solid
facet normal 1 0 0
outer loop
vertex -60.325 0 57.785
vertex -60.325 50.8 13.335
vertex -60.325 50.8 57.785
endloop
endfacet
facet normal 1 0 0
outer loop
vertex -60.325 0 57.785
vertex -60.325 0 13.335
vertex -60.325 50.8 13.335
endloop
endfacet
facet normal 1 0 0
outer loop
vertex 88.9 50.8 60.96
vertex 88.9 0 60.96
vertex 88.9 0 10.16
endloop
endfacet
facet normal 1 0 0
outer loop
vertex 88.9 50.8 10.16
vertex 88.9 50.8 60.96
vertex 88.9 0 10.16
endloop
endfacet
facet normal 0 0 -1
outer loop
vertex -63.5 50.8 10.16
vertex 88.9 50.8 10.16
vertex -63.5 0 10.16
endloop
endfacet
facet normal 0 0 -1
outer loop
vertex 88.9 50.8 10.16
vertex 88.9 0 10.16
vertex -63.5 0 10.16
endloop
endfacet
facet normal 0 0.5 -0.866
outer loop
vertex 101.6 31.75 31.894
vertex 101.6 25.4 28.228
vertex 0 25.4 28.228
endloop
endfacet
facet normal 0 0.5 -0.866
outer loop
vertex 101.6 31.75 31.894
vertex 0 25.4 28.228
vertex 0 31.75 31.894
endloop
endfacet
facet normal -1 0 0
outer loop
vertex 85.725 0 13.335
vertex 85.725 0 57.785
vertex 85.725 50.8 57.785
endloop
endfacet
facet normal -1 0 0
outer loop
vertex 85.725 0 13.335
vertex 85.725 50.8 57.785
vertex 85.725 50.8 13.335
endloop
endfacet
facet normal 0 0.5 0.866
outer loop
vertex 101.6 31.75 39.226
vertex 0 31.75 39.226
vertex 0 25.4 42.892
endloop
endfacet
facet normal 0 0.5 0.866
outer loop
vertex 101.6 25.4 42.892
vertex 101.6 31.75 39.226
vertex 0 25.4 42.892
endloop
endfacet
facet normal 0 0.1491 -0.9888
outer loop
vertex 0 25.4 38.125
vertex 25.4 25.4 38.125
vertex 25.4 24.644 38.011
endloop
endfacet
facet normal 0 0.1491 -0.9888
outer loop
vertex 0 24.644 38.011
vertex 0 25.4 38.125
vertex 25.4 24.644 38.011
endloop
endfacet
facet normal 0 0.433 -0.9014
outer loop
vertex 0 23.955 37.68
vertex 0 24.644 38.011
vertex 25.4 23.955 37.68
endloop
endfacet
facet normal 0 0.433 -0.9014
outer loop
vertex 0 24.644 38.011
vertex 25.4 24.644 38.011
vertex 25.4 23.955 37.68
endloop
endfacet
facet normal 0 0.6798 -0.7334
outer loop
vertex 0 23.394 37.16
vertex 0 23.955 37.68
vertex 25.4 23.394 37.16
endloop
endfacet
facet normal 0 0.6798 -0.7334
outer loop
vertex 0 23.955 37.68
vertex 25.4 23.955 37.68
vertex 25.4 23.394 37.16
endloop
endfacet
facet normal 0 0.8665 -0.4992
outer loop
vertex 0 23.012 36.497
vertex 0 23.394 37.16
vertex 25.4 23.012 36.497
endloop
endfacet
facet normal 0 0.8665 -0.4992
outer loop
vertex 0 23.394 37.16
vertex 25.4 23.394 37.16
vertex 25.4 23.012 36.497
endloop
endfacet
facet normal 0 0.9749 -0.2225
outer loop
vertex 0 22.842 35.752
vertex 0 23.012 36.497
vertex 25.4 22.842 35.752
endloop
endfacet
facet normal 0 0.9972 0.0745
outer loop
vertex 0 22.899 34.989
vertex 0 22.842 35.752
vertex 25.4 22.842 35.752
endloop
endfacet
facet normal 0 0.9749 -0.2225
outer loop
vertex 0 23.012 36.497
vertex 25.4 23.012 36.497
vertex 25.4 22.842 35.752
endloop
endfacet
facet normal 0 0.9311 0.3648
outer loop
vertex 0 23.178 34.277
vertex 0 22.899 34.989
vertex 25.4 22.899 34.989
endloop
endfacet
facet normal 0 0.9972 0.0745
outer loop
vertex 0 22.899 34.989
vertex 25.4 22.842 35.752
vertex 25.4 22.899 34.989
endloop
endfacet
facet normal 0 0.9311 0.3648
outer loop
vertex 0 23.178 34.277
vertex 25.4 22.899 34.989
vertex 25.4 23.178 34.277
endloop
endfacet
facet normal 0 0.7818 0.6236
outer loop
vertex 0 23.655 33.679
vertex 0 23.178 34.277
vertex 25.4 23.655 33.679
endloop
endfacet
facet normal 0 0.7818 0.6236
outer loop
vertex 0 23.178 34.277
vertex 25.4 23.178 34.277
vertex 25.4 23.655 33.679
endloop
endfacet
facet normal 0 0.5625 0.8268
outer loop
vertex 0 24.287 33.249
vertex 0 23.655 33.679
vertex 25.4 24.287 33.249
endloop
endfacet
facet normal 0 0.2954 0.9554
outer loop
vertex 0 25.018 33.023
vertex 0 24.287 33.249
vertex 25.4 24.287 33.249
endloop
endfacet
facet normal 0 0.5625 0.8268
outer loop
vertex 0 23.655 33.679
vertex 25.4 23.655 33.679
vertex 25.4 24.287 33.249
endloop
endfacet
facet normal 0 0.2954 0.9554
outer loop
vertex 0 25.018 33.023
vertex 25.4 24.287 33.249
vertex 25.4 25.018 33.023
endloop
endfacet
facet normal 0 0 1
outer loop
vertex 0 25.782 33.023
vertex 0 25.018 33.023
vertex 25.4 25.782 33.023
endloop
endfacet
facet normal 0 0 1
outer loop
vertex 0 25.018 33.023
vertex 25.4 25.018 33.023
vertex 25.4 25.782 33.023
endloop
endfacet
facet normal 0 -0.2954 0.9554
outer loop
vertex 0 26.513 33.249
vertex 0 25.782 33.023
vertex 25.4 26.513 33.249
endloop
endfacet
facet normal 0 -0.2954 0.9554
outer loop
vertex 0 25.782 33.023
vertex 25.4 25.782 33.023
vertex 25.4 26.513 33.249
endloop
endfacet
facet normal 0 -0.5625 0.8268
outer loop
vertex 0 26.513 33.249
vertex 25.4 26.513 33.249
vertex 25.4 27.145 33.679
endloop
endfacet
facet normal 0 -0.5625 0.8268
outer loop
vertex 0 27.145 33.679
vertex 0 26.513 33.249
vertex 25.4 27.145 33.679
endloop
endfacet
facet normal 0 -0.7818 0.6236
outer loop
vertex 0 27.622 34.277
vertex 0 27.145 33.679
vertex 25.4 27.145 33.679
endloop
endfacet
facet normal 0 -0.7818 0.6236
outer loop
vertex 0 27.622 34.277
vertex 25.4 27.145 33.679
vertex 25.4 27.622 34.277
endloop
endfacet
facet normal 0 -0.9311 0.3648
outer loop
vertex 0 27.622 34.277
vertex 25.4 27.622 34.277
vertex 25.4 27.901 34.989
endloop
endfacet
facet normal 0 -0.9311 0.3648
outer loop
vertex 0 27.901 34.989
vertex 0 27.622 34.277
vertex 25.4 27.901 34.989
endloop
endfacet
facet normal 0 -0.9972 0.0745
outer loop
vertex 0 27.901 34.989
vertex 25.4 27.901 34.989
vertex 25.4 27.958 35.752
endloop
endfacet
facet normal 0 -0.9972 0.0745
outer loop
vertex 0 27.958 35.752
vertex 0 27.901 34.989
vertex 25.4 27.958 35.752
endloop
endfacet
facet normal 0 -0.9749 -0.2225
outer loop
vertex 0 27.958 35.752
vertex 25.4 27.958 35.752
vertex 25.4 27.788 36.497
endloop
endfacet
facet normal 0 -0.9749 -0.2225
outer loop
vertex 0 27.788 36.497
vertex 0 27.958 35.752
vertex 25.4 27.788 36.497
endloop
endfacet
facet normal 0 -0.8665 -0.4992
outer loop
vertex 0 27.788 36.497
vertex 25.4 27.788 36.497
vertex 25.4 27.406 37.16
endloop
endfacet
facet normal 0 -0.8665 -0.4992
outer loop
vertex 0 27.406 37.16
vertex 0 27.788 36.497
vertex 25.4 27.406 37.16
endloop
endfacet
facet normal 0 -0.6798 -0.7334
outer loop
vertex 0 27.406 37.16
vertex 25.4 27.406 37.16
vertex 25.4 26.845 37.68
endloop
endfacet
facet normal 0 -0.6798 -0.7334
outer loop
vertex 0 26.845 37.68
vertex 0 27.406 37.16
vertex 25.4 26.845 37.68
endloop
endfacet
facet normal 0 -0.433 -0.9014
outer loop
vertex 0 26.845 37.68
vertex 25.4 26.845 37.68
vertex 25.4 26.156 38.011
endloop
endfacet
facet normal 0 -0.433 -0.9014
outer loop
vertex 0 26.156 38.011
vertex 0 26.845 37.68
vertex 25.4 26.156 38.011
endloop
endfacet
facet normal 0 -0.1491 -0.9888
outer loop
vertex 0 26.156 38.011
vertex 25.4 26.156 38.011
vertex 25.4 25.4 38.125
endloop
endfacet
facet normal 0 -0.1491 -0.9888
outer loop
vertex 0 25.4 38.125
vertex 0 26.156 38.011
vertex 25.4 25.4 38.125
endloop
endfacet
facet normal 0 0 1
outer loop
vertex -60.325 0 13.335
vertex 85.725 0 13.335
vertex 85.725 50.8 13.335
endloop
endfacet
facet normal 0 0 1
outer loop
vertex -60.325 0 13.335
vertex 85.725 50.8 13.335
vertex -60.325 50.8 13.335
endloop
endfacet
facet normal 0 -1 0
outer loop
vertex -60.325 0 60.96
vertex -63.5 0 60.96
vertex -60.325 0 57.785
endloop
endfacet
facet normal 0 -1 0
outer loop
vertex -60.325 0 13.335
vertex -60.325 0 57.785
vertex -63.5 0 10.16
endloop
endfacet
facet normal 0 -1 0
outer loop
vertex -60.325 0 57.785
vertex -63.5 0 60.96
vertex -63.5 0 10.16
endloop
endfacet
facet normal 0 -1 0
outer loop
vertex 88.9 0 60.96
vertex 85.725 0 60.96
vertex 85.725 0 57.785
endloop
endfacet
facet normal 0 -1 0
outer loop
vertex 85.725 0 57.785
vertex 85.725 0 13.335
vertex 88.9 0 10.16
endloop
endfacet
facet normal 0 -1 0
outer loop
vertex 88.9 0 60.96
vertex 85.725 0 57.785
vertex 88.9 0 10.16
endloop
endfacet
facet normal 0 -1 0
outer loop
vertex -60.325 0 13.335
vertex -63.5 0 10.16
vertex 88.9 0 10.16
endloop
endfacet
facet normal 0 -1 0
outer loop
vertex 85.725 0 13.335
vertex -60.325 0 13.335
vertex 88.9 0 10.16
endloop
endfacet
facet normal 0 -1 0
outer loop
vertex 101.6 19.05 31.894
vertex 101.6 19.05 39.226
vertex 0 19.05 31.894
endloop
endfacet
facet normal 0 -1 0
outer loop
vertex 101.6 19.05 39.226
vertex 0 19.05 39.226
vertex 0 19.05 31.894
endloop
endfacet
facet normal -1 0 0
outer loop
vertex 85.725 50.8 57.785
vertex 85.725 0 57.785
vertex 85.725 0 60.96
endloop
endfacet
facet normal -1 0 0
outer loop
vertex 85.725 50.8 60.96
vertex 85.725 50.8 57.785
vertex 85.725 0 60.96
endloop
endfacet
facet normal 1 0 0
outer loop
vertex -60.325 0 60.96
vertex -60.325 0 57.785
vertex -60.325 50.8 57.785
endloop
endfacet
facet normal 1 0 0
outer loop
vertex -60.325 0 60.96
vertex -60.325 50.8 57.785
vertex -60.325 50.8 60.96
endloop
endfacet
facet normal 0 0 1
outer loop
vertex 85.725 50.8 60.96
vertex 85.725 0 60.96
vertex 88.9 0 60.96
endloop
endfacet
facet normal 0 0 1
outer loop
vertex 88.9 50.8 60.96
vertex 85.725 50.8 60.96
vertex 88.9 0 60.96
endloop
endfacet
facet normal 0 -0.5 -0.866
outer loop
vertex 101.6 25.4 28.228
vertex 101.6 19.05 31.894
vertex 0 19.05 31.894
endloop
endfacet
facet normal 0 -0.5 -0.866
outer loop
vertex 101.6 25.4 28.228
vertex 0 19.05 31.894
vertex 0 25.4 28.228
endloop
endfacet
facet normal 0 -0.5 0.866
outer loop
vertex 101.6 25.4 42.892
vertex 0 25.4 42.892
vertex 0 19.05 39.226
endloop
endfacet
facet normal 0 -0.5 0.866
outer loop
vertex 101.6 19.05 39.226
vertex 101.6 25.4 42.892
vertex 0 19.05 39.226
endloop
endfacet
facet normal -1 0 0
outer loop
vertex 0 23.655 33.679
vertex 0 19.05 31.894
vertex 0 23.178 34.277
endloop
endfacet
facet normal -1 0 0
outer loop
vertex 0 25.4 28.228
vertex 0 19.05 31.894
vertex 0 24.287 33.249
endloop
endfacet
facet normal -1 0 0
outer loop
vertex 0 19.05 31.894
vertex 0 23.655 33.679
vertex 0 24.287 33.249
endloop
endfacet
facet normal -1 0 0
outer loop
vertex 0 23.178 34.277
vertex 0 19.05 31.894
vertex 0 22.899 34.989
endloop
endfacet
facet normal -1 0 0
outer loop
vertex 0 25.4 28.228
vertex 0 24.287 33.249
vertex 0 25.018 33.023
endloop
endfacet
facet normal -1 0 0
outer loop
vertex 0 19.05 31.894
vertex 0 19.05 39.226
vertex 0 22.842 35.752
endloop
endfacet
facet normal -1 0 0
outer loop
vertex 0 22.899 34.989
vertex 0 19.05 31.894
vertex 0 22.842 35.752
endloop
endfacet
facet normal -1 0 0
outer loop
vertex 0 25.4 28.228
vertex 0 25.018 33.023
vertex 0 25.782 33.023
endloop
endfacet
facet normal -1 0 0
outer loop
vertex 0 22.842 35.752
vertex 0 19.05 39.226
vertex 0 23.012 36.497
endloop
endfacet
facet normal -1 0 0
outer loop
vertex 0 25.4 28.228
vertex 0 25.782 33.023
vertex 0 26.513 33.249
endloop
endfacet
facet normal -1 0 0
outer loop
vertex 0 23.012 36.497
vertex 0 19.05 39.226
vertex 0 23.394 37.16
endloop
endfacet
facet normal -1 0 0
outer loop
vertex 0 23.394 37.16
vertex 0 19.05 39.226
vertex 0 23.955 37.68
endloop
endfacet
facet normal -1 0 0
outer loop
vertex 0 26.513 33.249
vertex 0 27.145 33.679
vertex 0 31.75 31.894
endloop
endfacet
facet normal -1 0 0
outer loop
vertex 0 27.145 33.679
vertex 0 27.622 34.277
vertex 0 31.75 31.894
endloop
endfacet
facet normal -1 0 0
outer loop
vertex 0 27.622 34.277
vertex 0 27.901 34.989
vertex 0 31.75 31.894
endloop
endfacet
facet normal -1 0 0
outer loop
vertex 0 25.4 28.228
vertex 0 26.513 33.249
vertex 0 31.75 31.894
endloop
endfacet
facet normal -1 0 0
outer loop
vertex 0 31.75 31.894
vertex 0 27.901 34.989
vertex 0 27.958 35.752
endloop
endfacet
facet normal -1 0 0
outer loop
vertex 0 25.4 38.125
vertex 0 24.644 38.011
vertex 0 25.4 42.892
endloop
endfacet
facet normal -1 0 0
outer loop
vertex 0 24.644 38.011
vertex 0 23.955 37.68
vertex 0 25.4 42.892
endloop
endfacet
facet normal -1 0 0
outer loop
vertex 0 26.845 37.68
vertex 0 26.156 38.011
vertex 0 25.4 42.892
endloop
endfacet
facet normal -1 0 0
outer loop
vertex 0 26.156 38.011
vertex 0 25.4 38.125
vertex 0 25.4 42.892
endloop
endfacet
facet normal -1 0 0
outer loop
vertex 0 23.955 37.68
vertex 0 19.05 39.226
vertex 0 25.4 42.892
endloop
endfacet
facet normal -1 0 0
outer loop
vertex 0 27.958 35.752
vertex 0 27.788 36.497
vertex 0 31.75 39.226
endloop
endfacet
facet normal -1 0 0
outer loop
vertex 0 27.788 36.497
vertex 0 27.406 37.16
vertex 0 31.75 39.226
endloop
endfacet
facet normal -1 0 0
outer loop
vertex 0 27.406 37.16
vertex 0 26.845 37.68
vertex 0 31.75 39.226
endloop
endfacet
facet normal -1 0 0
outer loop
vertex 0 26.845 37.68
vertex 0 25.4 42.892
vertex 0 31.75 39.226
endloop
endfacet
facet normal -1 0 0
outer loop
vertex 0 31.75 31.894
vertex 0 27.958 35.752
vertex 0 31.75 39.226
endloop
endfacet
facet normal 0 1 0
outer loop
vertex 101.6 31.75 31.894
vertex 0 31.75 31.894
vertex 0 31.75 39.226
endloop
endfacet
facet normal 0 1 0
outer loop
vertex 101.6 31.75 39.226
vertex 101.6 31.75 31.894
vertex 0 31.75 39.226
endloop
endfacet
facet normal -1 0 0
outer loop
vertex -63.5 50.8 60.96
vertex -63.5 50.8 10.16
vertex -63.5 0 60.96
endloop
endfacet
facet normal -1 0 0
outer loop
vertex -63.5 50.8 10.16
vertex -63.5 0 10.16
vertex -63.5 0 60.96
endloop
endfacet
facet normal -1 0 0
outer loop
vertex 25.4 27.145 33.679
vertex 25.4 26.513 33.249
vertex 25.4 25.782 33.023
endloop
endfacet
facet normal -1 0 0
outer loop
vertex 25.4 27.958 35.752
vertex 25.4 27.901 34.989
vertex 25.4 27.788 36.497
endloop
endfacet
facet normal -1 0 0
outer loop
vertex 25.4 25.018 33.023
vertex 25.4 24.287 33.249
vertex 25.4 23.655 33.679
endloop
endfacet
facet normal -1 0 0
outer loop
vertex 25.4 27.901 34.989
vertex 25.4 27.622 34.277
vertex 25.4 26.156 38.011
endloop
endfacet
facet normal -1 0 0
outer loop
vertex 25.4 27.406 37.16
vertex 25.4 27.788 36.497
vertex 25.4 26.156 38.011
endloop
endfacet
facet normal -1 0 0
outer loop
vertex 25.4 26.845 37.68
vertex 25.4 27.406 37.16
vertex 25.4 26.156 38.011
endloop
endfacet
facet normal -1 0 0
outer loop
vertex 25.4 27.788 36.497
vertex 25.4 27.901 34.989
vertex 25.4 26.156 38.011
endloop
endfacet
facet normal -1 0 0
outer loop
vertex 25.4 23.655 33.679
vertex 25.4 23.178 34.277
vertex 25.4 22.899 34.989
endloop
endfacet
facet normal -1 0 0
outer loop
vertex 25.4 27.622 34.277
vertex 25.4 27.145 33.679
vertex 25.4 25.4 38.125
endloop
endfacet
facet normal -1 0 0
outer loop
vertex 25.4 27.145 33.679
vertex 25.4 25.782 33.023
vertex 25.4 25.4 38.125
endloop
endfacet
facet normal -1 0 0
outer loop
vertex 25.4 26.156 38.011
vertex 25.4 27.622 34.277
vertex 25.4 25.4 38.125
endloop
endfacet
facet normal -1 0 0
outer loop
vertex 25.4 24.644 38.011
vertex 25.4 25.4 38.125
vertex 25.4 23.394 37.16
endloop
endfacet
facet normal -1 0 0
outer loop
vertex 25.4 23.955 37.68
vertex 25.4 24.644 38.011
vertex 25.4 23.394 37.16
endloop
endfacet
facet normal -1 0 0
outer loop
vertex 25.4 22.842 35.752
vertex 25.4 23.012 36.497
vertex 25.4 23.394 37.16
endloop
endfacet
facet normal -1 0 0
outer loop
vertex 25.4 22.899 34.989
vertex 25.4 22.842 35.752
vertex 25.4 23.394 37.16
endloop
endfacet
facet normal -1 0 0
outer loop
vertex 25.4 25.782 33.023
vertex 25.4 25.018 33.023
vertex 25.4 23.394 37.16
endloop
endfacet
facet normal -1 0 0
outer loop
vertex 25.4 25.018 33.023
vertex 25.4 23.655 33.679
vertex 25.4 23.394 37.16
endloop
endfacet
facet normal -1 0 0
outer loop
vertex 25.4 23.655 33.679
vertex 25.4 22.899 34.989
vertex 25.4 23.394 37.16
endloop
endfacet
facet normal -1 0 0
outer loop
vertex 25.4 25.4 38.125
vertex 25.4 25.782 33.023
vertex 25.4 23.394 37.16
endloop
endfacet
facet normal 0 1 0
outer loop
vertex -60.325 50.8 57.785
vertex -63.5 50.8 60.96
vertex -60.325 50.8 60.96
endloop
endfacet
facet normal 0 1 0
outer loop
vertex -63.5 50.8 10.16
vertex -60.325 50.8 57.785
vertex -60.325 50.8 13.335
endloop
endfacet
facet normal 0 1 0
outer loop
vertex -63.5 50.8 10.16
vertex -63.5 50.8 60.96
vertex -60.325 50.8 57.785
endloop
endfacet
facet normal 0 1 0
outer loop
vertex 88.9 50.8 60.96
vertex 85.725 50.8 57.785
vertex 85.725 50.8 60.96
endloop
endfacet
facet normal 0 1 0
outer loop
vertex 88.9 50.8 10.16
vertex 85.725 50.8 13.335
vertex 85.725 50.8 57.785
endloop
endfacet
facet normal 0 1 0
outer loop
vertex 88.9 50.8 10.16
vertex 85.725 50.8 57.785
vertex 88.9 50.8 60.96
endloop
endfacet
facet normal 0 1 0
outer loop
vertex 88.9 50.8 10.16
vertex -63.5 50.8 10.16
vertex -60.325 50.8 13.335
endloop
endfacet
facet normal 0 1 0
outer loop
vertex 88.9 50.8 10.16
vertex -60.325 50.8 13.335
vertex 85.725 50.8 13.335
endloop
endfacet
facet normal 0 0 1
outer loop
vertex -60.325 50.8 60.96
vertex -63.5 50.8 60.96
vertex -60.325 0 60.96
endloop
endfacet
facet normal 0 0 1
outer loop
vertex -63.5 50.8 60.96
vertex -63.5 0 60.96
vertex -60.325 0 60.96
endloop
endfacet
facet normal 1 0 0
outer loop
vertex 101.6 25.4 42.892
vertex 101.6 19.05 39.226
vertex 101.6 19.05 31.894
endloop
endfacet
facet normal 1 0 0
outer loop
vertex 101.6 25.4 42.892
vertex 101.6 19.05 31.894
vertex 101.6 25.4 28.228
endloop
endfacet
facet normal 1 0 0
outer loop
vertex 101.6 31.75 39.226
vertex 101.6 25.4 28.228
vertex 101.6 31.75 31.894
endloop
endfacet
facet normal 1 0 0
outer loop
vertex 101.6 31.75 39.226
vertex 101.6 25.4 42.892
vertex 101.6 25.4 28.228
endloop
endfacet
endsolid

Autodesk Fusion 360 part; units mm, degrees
sketch "Sketch1" plane through (0, 0, 0) normal (0, 1, 0) x (1, 0, 0) in component "Winch Baseplate"
  line L0 (88.9, -60.96) -> (88.9, -10.16)
  line L1 (88.9, -10.16) -> (-63.5, -10.16)
  line L2 (-63.5, -10.16) -> (-63.5, -60.96)
  line L3 (85.725, -57.785) -> (85.725, -13.335)
  line L4 (85.725, -13.335) -> (-60.325, -13.335)
  line L5 (-60.325, -13.335) -> (-60.325, -57.785)
  line L6 (-60.325, -57.785) -> (-60.325, -60.96)
  line L7 (85.725, -57.785) -> (85.725, -60.96)
  line L8 (-63.5, -60.96) -> (-60.325, -60.96)
  line L9 (85.725, -60.96) -> (88.9, -60.96)
  dimension "d1" = 152.4
  dimension "d2" = 50.8
extrude "Extrude1" add sketch "Sketch1" along normal blind 50.8 makes body 1 in component "Winch Baseplate"
sketch "Sketch1 (2)" plane through (0, 0, 0) normal (1, 0, 0) x (0, 1, 0) in component "Winch Axle Extension"
  curve L0
  line L1 (50.8, 10.16) -> (0, 60.96)
  line L2 (19.05, 31.8938) -> (25.4, 28.2277)
  line L3 (25.4, 28.2277) -> (31.75, 31.8938)
  line L4 (31.75, 31.8938) -> (31.75, 39.2262)
  line L5 (31.75, 39.2262) -> (25.4, 42.8923)
  line L6 (25.4, 42.8923) -> (19.05, 39.2262)
  line L7 (19.05, 39.2262) -> (19.05, 31.8938)
  point P0 (25.4, 35.56)
  dimension "d7" = 6.35
extrude "Extrude1'" add sketch "Sketch1 (2)" along normal blind 101.6 separate body makes body 2 in component "Winch Axle Extension"
sketch "Sketch2" plane through (0, 0, 0) normal (-1, 0, 0) x (0, -1, 0) in component "Winch Axle Extension"
  line L0 (-19.05, 31.8938) -> (-19.05, 39.2262)
  line L1 (-19.05, 39.2262) -> (-25.4, 42.8923)
  line L2 (-25.4, 42.8923) -> (-31.75, 39.2262)
  line L3 (-31.75, 39.2262) -> (-31.75, 31.8938)
  line L4 (-31.75, 31.8938) -> (-25.4, 28.2277)
  line L5 (-25.4, 28.2277) -> (-19.05, 31.8938)
  line L6 (-31.75, 39.2262) -> (-19.05, 31.8938)
  circle A0 centre (-25.4, 35.56) radius 3.175
  dimension "d10" = 6.35
hole "Hole1" at (0, 25.4, 35.56) direction (1, 0, 0) diameter 5.1308 depth 25.4 tip angle 180 bodies 2 in component "Winch Axle Extension"
sketch "Sketch1 (3)" plane through (0, 0, 0) normal (1, 0, 0) x (0, 1, 0) in component "Winch Axle Connection"
component "Winch" placed x (1, 0, 0) y (0, 1, 0) z (0, 0, 1) at (0, 0, 0)
component "Winch Baseplate" placed x (1, 0, 0) y (0, 1, 0) z (0, 0, 1) at (0, 0, 0) in component "Winch"
component "Winch Axle Extension" placed x (1, 0, 0) y (0, 1, 0) z (0, 0, 1) at (0, 0, 0) in component "Winch"
component "Winch Axle Connection" placed x (1, 0, 0) y (0, 1, 0) z (0, 0, 1) at (0, 0, 0) in component "Winch Axle Extension"
